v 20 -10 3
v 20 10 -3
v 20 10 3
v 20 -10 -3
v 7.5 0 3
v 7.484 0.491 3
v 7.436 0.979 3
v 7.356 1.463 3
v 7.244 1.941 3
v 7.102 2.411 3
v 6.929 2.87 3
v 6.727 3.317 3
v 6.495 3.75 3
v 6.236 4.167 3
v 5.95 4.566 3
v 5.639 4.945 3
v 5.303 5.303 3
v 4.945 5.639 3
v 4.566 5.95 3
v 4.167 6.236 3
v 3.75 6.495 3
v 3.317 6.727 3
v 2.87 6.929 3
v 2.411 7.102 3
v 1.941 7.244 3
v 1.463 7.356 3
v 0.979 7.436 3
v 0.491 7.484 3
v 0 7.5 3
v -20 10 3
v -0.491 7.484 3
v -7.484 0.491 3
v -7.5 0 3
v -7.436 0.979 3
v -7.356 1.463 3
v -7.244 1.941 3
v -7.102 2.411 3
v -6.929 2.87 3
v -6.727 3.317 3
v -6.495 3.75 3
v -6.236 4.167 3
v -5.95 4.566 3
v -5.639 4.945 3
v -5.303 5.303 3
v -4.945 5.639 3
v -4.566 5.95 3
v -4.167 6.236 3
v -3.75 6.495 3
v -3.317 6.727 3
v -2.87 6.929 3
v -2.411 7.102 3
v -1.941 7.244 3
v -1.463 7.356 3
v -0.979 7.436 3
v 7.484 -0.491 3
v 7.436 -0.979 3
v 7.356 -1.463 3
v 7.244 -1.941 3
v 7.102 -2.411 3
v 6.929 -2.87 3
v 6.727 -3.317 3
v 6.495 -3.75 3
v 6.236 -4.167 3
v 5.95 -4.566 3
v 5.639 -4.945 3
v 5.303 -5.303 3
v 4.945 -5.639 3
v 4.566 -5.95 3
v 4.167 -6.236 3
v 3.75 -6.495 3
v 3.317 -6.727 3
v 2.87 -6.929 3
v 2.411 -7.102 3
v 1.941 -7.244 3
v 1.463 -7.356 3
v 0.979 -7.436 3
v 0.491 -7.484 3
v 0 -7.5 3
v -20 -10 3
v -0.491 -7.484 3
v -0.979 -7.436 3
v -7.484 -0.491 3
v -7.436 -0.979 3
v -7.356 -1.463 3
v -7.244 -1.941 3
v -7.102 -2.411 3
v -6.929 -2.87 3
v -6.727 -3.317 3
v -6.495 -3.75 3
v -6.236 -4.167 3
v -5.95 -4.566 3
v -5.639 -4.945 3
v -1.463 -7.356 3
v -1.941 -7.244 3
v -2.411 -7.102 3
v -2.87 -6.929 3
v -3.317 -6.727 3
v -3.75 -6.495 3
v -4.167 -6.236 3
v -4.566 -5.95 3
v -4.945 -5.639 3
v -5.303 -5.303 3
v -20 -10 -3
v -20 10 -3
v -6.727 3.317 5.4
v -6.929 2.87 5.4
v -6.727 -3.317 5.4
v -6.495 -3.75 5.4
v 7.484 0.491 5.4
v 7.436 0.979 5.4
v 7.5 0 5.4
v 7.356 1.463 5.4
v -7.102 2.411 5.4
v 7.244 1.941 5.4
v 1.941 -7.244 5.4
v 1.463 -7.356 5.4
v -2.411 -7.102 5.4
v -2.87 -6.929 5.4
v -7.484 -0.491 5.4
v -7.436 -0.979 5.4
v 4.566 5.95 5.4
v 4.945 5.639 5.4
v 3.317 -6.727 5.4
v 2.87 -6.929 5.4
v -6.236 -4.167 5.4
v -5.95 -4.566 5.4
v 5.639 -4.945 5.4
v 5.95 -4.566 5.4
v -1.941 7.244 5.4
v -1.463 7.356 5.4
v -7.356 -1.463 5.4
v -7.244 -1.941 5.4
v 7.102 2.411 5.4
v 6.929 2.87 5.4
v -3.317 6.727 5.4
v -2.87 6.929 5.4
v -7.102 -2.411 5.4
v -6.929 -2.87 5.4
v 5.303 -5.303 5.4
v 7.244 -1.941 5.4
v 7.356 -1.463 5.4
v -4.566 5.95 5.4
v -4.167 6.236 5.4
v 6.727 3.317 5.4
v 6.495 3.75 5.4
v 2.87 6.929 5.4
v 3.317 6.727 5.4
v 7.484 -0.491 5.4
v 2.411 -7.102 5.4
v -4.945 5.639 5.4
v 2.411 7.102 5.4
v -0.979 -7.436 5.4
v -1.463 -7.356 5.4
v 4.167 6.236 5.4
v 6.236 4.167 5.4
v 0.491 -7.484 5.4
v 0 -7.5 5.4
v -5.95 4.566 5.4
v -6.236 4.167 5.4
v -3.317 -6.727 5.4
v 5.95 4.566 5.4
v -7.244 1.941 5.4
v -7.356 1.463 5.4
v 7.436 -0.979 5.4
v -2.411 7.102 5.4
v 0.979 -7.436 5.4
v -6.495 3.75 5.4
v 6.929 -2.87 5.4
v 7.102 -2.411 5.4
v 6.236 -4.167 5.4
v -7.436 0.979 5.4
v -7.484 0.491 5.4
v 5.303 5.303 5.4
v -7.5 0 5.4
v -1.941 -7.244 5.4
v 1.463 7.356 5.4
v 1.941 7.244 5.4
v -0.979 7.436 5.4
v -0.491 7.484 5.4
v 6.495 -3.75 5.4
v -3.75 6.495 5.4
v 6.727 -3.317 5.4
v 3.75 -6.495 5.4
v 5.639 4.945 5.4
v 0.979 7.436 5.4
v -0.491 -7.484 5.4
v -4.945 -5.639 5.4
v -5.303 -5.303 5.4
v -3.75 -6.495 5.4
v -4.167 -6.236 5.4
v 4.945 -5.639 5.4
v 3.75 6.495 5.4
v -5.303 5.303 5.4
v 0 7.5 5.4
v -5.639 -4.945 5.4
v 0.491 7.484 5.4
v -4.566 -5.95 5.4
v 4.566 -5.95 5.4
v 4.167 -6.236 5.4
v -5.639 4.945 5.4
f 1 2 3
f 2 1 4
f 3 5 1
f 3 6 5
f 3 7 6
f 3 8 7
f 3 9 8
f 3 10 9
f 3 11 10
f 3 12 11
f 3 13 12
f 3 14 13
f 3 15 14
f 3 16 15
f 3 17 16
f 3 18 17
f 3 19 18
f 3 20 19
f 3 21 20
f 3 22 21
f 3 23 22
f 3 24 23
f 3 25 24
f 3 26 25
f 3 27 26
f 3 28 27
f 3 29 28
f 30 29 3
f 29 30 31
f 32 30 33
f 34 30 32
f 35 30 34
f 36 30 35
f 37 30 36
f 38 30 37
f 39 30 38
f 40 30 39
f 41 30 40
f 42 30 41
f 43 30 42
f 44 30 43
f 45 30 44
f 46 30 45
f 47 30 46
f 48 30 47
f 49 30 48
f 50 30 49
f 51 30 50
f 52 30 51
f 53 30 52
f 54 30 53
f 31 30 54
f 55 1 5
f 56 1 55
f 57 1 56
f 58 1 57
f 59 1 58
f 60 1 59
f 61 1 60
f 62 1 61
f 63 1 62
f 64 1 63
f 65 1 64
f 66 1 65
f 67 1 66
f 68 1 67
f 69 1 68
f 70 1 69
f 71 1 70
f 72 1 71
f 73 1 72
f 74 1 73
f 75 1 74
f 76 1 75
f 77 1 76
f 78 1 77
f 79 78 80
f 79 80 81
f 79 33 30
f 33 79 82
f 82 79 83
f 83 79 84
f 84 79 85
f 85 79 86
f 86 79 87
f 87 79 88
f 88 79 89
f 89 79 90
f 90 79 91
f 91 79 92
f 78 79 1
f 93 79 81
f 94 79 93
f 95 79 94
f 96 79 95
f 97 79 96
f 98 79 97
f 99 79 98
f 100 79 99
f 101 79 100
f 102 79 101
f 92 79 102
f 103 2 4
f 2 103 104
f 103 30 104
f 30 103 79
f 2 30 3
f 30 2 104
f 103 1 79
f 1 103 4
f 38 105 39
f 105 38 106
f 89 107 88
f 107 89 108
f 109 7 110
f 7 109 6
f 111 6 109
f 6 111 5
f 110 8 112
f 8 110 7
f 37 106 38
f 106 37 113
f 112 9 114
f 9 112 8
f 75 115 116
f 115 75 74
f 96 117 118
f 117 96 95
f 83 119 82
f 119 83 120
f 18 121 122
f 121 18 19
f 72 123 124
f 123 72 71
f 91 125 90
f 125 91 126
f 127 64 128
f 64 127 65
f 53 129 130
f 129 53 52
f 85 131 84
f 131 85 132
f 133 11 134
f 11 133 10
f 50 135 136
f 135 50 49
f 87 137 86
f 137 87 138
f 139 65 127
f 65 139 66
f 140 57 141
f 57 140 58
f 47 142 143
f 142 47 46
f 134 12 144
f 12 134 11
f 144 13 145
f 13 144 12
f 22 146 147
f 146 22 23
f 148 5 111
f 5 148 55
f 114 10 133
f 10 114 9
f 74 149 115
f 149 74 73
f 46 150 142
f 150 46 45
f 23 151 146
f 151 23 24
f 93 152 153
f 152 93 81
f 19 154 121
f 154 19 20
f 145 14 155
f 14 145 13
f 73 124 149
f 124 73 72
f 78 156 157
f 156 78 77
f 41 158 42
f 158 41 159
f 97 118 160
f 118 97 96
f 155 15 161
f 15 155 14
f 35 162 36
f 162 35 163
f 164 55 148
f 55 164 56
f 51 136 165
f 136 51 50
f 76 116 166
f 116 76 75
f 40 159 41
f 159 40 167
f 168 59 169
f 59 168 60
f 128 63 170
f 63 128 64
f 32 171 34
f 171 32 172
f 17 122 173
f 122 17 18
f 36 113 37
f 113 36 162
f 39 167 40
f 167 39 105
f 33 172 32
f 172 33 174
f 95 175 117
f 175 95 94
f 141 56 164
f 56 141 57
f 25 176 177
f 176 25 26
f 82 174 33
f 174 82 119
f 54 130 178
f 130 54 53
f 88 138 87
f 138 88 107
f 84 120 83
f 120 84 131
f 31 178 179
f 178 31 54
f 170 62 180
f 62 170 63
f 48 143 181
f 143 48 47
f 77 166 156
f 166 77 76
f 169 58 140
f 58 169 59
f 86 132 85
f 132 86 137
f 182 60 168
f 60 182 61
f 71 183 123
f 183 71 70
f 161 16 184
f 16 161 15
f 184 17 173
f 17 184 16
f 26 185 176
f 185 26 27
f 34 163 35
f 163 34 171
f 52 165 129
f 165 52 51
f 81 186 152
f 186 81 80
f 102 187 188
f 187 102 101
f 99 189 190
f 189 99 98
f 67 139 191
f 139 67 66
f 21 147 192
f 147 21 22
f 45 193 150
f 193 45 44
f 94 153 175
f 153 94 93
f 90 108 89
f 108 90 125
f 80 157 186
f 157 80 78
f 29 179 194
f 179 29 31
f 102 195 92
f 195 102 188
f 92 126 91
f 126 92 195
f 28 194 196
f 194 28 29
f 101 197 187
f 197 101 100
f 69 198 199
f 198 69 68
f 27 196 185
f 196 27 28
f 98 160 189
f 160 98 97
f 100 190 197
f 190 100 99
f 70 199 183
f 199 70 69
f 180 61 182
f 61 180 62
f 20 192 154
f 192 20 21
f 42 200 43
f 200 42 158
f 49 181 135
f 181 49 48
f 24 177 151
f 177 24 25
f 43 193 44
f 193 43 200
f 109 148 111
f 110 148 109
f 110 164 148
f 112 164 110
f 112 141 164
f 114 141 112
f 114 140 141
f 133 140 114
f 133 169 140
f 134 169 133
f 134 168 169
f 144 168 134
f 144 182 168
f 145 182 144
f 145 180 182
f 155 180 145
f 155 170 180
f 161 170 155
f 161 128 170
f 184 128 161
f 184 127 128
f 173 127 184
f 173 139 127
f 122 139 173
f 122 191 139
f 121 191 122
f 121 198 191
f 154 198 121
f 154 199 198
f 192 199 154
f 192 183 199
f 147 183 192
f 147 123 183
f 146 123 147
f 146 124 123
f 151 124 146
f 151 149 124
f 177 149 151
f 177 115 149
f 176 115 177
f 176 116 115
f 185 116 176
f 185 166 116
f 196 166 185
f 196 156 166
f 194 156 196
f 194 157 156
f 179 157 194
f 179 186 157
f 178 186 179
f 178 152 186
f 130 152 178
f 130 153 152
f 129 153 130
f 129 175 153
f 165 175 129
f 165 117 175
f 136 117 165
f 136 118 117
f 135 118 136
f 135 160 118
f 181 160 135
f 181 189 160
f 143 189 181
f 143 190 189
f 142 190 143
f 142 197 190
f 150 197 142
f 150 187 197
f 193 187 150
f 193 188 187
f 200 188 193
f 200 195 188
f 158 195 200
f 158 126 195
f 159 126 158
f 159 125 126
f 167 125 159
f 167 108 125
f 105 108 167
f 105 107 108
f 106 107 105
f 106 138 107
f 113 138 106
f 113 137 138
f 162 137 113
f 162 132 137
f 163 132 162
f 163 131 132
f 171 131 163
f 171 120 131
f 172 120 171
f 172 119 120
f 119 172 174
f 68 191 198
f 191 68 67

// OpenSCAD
// Self-contained magnet (no external libraries) to avoid blank renders.
// One connected solid: a rectangular base with a cylindrical magnet bonded on top.

$fn = 96;

base_x = 40;
base_y = 20;
base_h = 6;

mag_r  = 7.5;
mag_h  = 3;

overlap = 0.6; // ensures watertight union

module magnet_component() {
    union() {
        // Base block
        cube([base_x, base_y, base_h], center=true);

        // Cylindrical magnet on top, positioned by dimensions (not arbitrary)
        translate([0, 0, base_h/2 + mag_h/2 - overlap])
            cylinder(r=mag_r, h=mag_h, center=true);
    }
}

magnet_component();
